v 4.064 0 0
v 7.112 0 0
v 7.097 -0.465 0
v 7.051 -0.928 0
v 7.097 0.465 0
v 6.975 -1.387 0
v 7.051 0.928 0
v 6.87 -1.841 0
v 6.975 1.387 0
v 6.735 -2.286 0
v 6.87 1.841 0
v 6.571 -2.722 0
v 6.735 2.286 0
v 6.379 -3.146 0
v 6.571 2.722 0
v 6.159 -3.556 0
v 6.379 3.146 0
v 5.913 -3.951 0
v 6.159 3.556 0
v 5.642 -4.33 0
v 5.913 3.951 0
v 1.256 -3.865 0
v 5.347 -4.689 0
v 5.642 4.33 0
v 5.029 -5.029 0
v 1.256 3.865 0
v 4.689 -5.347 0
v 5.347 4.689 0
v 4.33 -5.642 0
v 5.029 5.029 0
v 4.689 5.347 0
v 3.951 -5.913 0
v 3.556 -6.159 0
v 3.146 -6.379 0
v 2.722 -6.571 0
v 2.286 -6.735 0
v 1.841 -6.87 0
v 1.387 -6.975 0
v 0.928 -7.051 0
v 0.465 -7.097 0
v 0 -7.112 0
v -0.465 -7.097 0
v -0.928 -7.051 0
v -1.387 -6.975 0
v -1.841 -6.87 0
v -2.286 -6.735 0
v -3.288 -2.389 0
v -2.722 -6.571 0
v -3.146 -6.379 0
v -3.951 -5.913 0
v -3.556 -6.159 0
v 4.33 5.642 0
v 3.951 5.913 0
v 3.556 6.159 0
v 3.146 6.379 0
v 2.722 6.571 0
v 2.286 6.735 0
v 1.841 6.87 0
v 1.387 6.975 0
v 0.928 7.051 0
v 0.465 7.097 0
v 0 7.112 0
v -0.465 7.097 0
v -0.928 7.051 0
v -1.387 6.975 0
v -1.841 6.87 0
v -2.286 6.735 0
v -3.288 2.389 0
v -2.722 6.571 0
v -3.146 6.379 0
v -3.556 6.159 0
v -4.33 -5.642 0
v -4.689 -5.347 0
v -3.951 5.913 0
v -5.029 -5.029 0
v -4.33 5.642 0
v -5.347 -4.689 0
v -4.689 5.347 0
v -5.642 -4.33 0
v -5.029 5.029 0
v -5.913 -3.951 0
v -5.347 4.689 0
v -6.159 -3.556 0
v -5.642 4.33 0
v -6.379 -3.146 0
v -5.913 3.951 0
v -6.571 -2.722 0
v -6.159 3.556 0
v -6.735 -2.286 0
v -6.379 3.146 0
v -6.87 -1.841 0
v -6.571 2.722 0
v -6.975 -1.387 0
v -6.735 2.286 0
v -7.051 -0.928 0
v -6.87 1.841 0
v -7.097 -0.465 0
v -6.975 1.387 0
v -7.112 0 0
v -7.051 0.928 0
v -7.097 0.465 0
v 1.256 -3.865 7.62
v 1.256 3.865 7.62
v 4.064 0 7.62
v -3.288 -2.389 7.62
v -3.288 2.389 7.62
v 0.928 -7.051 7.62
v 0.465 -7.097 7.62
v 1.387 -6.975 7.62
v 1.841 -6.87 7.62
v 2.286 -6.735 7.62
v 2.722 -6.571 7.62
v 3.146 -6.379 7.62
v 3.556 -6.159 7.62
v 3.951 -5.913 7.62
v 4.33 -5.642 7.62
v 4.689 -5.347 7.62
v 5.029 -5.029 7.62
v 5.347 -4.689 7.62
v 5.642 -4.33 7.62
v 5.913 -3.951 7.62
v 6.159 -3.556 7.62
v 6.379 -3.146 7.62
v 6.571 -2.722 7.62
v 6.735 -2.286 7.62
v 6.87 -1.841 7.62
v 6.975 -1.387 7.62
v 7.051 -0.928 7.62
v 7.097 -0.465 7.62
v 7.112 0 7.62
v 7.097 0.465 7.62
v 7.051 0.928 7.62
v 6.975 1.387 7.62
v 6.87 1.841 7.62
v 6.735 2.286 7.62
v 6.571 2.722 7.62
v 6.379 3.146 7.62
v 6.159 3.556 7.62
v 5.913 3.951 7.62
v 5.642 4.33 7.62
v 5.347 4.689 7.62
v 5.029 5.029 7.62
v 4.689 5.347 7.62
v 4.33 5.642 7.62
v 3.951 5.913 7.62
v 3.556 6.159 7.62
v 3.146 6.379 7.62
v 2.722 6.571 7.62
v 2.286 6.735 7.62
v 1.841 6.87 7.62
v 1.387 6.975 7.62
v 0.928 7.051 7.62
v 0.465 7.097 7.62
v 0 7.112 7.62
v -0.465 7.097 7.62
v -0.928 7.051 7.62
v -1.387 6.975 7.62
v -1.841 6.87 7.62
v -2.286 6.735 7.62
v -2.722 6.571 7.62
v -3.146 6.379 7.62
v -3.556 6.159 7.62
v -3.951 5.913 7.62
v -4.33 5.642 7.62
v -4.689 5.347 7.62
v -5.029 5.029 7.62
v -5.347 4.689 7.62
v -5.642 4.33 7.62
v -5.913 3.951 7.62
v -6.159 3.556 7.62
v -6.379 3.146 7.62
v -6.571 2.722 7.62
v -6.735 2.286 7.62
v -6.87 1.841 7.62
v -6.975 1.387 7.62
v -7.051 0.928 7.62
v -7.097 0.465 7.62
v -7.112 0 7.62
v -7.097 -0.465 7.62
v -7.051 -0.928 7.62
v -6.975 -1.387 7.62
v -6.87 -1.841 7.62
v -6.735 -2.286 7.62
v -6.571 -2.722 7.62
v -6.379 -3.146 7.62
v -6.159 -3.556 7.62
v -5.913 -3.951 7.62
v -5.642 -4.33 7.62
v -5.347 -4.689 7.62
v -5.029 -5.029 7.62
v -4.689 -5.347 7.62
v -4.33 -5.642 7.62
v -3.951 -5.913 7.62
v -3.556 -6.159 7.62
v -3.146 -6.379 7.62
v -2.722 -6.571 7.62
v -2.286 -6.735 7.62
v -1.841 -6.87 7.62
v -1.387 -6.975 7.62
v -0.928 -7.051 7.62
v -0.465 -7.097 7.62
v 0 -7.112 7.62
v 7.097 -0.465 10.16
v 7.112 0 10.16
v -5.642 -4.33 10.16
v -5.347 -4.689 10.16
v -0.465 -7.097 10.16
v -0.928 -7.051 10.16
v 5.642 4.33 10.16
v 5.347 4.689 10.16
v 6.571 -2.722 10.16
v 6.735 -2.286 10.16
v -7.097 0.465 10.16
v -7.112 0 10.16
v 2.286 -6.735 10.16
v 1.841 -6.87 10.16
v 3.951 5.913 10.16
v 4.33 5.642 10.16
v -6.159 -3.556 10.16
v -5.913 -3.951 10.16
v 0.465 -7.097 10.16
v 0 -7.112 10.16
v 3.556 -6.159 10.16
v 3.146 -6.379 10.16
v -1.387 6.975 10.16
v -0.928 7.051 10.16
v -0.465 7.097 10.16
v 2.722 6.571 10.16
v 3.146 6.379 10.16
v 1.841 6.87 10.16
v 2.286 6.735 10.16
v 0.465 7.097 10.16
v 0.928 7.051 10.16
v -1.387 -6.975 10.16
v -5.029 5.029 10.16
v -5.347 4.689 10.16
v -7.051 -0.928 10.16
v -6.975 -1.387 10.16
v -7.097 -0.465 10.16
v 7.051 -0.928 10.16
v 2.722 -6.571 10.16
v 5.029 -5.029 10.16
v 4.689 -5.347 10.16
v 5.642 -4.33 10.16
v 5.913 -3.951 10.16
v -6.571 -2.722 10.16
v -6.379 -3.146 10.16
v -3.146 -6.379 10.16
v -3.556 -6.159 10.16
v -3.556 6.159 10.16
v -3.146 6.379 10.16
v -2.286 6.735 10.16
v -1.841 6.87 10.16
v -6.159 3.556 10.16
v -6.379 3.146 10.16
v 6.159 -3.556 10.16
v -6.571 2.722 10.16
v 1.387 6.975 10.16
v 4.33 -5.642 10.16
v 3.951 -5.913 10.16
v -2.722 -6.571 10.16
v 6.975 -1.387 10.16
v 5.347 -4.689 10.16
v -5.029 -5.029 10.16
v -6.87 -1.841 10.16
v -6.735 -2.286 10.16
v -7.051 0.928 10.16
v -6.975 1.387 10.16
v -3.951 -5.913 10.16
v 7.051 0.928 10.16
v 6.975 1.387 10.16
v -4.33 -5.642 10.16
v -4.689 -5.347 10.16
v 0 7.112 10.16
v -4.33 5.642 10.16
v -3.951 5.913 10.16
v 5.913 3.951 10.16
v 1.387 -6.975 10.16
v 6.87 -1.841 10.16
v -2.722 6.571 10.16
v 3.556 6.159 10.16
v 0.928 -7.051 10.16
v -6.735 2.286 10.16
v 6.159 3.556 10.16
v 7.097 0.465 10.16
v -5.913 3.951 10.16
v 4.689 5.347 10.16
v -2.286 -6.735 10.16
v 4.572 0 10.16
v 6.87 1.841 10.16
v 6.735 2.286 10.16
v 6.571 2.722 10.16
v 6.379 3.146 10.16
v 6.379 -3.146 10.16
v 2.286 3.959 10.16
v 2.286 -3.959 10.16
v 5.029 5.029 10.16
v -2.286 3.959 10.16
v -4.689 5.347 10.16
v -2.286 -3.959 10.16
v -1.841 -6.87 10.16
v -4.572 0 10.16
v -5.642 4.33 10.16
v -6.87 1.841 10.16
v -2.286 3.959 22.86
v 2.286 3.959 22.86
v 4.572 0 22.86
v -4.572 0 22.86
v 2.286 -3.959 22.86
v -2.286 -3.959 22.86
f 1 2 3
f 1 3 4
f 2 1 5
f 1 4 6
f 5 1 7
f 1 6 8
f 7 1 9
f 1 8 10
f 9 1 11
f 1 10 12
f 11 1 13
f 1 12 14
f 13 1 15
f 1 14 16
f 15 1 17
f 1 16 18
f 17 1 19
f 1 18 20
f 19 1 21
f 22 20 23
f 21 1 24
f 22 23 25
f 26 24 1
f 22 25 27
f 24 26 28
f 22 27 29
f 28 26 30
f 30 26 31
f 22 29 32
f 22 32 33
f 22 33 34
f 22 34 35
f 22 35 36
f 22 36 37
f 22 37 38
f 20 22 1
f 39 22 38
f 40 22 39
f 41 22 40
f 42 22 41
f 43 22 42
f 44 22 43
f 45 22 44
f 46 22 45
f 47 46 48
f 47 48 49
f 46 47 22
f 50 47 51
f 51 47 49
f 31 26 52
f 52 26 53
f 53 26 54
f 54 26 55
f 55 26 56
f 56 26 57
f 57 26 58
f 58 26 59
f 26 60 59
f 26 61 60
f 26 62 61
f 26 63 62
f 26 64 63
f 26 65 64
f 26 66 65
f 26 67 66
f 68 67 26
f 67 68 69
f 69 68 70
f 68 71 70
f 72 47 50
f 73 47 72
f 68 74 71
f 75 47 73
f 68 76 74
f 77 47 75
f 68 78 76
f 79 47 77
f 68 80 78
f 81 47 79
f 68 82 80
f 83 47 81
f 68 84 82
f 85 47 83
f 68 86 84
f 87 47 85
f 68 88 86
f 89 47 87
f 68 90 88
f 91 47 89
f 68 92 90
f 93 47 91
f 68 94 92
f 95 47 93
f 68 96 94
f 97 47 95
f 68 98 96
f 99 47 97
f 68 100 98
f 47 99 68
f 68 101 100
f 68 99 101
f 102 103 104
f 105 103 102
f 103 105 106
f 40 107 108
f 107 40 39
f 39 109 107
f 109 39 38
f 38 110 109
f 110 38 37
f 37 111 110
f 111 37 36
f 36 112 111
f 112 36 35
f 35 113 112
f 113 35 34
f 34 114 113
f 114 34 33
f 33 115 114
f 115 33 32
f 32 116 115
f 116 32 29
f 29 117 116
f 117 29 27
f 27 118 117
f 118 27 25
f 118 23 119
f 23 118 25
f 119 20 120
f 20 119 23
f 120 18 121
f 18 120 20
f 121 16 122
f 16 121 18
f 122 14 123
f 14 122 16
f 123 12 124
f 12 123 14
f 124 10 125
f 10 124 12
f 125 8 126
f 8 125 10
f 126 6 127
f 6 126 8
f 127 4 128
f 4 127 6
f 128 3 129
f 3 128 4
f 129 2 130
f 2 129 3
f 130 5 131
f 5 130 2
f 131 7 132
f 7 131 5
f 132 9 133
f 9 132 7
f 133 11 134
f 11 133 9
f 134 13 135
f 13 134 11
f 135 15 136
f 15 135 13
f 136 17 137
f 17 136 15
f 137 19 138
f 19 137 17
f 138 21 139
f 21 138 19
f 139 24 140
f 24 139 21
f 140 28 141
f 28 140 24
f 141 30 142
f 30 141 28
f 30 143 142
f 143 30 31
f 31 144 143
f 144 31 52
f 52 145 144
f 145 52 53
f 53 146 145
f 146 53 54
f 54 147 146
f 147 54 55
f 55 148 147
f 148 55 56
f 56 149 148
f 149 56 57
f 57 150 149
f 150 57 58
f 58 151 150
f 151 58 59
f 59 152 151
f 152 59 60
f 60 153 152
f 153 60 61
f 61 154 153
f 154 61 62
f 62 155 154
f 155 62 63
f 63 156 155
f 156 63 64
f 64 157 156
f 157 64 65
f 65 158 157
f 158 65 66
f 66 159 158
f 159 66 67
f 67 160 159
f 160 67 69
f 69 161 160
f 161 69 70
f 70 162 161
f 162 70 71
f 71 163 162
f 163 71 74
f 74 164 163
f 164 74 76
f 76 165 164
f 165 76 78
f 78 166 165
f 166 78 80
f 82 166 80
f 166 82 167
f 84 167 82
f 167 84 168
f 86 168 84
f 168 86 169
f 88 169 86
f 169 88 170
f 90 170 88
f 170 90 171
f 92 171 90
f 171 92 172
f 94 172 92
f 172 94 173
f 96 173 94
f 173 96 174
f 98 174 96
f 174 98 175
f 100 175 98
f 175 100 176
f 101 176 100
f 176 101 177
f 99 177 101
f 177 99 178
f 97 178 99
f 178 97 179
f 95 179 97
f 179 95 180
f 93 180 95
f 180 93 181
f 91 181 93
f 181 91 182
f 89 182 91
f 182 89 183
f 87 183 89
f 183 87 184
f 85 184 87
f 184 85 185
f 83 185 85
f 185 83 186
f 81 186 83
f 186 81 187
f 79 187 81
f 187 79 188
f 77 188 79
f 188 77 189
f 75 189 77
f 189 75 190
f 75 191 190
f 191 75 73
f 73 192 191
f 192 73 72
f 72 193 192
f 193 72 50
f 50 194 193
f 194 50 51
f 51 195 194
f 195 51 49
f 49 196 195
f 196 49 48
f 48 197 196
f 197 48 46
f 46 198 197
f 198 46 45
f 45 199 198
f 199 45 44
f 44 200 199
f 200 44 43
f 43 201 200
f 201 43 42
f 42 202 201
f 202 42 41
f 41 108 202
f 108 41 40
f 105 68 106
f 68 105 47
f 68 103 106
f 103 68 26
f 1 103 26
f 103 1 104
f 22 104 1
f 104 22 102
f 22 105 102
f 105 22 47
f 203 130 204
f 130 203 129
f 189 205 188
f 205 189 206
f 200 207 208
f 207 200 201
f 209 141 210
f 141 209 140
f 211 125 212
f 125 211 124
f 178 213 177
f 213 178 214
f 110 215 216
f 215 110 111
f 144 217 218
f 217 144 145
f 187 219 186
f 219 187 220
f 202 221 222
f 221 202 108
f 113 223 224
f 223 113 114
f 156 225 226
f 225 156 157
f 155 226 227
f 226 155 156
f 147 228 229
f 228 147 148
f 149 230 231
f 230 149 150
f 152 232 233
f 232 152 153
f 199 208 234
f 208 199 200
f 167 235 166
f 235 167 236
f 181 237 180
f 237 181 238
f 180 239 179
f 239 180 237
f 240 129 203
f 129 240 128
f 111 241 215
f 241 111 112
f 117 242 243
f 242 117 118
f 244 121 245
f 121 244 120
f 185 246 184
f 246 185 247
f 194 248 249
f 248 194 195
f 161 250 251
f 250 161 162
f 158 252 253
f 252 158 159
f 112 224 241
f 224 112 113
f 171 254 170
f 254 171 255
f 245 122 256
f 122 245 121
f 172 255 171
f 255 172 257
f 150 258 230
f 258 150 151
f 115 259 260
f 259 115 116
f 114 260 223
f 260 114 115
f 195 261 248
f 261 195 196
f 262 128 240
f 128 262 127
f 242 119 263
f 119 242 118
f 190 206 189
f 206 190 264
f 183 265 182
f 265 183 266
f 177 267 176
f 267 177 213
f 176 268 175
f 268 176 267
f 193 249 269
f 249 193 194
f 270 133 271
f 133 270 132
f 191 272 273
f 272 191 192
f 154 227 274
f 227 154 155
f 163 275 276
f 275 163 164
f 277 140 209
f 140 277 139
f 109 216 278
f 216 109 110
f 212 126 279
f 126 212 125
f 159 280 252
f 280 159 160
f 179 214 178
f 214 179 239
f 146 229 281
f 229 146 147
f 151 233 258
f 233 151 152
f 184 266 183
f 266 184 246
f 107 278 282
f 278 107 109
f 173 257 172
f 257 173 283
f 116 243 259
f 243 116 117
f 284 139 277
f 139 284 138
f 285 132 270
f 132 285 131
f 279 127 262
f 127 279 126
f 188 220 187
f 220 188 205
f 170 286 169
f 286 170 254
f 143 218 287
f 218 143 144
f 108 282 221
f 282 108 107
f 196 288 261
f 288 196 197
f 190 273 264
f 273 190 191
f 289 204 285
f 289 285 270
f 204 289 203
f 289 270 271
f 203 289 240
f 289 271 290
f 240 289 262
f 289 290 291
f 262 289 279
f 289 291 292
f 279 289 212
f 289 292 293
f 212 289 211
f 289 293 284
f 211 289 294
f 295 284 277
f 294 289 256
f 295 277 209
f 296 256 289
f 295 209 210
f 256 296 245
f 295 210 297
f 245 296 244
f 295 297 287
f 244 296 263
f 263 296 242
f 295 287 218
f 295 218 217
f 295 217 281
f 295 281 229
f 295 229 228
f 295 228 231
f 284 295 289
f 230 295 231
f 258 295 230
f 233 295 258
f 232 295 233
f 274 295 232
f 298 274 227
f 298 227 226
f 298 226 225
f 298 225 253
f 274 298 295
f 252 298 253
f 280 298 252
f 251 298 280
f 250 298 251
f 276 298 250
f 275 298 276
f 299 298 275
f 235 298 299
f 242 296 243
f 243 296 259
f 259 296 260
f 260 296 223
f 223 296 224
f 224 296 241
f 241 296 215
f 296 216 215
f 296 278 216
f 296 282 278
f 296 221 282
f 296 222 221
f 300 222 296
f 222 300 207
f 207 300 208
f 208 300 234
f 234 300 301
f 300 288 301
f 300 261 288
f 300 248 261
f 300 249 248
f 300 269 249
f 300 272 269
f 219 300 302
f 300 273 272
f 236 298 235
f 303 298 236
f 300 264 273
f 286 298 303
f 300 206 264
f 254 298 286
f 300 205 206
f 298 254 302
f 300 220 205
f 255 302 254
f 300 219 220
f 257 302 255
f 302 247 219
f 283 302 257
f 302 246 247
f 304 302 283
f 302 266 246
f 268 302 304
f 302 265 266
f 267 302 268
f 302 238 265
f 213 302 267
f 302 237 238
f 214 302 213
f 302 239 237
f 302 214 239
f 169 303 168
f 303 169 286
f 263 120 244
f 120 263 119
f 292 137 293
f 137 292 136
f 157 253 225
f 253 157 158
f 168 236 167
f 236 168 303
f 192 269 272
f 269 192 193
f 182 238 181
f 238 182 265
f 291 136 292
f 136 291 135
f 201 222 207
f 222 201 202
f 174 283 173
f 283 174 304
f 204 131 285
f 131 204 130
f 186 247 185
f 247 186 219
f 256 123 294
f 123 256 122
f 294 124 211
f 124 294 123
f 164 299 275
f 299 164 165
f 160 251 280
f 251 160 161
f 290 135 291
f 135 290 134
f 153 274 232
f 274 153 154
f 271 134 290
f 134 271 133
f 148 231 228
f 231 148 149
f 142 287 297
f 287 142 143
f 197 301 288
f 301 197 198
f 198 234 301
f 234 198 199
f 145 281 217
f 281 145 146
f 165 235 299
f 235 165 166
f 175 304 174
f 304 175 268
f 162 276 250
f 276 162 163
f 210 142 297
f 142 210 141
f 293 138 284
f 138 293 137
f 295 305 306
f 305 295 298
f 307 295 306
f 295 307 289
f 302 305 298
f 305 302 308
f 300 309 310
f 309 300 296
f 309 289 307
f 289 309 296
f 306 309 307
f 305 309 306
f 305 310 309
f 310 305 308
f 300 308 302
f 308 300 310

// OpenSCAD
ViewScale = [0.0254, 0.0254, 0.0254];

module adapter()
{
    linear_extrude(300)
    difference() {
    circle(280, $fn=96);
    circle(160, $fn=5);
    }
    translate([0, 0, 300])
    linear_extrude(100)
    circle(280, $fn=96);

    translate([0, 0, 400])
    linear_extrude(500)
    circle(180, $fn=6);
}

scale(ViewScale)
{
    adapter();
}
